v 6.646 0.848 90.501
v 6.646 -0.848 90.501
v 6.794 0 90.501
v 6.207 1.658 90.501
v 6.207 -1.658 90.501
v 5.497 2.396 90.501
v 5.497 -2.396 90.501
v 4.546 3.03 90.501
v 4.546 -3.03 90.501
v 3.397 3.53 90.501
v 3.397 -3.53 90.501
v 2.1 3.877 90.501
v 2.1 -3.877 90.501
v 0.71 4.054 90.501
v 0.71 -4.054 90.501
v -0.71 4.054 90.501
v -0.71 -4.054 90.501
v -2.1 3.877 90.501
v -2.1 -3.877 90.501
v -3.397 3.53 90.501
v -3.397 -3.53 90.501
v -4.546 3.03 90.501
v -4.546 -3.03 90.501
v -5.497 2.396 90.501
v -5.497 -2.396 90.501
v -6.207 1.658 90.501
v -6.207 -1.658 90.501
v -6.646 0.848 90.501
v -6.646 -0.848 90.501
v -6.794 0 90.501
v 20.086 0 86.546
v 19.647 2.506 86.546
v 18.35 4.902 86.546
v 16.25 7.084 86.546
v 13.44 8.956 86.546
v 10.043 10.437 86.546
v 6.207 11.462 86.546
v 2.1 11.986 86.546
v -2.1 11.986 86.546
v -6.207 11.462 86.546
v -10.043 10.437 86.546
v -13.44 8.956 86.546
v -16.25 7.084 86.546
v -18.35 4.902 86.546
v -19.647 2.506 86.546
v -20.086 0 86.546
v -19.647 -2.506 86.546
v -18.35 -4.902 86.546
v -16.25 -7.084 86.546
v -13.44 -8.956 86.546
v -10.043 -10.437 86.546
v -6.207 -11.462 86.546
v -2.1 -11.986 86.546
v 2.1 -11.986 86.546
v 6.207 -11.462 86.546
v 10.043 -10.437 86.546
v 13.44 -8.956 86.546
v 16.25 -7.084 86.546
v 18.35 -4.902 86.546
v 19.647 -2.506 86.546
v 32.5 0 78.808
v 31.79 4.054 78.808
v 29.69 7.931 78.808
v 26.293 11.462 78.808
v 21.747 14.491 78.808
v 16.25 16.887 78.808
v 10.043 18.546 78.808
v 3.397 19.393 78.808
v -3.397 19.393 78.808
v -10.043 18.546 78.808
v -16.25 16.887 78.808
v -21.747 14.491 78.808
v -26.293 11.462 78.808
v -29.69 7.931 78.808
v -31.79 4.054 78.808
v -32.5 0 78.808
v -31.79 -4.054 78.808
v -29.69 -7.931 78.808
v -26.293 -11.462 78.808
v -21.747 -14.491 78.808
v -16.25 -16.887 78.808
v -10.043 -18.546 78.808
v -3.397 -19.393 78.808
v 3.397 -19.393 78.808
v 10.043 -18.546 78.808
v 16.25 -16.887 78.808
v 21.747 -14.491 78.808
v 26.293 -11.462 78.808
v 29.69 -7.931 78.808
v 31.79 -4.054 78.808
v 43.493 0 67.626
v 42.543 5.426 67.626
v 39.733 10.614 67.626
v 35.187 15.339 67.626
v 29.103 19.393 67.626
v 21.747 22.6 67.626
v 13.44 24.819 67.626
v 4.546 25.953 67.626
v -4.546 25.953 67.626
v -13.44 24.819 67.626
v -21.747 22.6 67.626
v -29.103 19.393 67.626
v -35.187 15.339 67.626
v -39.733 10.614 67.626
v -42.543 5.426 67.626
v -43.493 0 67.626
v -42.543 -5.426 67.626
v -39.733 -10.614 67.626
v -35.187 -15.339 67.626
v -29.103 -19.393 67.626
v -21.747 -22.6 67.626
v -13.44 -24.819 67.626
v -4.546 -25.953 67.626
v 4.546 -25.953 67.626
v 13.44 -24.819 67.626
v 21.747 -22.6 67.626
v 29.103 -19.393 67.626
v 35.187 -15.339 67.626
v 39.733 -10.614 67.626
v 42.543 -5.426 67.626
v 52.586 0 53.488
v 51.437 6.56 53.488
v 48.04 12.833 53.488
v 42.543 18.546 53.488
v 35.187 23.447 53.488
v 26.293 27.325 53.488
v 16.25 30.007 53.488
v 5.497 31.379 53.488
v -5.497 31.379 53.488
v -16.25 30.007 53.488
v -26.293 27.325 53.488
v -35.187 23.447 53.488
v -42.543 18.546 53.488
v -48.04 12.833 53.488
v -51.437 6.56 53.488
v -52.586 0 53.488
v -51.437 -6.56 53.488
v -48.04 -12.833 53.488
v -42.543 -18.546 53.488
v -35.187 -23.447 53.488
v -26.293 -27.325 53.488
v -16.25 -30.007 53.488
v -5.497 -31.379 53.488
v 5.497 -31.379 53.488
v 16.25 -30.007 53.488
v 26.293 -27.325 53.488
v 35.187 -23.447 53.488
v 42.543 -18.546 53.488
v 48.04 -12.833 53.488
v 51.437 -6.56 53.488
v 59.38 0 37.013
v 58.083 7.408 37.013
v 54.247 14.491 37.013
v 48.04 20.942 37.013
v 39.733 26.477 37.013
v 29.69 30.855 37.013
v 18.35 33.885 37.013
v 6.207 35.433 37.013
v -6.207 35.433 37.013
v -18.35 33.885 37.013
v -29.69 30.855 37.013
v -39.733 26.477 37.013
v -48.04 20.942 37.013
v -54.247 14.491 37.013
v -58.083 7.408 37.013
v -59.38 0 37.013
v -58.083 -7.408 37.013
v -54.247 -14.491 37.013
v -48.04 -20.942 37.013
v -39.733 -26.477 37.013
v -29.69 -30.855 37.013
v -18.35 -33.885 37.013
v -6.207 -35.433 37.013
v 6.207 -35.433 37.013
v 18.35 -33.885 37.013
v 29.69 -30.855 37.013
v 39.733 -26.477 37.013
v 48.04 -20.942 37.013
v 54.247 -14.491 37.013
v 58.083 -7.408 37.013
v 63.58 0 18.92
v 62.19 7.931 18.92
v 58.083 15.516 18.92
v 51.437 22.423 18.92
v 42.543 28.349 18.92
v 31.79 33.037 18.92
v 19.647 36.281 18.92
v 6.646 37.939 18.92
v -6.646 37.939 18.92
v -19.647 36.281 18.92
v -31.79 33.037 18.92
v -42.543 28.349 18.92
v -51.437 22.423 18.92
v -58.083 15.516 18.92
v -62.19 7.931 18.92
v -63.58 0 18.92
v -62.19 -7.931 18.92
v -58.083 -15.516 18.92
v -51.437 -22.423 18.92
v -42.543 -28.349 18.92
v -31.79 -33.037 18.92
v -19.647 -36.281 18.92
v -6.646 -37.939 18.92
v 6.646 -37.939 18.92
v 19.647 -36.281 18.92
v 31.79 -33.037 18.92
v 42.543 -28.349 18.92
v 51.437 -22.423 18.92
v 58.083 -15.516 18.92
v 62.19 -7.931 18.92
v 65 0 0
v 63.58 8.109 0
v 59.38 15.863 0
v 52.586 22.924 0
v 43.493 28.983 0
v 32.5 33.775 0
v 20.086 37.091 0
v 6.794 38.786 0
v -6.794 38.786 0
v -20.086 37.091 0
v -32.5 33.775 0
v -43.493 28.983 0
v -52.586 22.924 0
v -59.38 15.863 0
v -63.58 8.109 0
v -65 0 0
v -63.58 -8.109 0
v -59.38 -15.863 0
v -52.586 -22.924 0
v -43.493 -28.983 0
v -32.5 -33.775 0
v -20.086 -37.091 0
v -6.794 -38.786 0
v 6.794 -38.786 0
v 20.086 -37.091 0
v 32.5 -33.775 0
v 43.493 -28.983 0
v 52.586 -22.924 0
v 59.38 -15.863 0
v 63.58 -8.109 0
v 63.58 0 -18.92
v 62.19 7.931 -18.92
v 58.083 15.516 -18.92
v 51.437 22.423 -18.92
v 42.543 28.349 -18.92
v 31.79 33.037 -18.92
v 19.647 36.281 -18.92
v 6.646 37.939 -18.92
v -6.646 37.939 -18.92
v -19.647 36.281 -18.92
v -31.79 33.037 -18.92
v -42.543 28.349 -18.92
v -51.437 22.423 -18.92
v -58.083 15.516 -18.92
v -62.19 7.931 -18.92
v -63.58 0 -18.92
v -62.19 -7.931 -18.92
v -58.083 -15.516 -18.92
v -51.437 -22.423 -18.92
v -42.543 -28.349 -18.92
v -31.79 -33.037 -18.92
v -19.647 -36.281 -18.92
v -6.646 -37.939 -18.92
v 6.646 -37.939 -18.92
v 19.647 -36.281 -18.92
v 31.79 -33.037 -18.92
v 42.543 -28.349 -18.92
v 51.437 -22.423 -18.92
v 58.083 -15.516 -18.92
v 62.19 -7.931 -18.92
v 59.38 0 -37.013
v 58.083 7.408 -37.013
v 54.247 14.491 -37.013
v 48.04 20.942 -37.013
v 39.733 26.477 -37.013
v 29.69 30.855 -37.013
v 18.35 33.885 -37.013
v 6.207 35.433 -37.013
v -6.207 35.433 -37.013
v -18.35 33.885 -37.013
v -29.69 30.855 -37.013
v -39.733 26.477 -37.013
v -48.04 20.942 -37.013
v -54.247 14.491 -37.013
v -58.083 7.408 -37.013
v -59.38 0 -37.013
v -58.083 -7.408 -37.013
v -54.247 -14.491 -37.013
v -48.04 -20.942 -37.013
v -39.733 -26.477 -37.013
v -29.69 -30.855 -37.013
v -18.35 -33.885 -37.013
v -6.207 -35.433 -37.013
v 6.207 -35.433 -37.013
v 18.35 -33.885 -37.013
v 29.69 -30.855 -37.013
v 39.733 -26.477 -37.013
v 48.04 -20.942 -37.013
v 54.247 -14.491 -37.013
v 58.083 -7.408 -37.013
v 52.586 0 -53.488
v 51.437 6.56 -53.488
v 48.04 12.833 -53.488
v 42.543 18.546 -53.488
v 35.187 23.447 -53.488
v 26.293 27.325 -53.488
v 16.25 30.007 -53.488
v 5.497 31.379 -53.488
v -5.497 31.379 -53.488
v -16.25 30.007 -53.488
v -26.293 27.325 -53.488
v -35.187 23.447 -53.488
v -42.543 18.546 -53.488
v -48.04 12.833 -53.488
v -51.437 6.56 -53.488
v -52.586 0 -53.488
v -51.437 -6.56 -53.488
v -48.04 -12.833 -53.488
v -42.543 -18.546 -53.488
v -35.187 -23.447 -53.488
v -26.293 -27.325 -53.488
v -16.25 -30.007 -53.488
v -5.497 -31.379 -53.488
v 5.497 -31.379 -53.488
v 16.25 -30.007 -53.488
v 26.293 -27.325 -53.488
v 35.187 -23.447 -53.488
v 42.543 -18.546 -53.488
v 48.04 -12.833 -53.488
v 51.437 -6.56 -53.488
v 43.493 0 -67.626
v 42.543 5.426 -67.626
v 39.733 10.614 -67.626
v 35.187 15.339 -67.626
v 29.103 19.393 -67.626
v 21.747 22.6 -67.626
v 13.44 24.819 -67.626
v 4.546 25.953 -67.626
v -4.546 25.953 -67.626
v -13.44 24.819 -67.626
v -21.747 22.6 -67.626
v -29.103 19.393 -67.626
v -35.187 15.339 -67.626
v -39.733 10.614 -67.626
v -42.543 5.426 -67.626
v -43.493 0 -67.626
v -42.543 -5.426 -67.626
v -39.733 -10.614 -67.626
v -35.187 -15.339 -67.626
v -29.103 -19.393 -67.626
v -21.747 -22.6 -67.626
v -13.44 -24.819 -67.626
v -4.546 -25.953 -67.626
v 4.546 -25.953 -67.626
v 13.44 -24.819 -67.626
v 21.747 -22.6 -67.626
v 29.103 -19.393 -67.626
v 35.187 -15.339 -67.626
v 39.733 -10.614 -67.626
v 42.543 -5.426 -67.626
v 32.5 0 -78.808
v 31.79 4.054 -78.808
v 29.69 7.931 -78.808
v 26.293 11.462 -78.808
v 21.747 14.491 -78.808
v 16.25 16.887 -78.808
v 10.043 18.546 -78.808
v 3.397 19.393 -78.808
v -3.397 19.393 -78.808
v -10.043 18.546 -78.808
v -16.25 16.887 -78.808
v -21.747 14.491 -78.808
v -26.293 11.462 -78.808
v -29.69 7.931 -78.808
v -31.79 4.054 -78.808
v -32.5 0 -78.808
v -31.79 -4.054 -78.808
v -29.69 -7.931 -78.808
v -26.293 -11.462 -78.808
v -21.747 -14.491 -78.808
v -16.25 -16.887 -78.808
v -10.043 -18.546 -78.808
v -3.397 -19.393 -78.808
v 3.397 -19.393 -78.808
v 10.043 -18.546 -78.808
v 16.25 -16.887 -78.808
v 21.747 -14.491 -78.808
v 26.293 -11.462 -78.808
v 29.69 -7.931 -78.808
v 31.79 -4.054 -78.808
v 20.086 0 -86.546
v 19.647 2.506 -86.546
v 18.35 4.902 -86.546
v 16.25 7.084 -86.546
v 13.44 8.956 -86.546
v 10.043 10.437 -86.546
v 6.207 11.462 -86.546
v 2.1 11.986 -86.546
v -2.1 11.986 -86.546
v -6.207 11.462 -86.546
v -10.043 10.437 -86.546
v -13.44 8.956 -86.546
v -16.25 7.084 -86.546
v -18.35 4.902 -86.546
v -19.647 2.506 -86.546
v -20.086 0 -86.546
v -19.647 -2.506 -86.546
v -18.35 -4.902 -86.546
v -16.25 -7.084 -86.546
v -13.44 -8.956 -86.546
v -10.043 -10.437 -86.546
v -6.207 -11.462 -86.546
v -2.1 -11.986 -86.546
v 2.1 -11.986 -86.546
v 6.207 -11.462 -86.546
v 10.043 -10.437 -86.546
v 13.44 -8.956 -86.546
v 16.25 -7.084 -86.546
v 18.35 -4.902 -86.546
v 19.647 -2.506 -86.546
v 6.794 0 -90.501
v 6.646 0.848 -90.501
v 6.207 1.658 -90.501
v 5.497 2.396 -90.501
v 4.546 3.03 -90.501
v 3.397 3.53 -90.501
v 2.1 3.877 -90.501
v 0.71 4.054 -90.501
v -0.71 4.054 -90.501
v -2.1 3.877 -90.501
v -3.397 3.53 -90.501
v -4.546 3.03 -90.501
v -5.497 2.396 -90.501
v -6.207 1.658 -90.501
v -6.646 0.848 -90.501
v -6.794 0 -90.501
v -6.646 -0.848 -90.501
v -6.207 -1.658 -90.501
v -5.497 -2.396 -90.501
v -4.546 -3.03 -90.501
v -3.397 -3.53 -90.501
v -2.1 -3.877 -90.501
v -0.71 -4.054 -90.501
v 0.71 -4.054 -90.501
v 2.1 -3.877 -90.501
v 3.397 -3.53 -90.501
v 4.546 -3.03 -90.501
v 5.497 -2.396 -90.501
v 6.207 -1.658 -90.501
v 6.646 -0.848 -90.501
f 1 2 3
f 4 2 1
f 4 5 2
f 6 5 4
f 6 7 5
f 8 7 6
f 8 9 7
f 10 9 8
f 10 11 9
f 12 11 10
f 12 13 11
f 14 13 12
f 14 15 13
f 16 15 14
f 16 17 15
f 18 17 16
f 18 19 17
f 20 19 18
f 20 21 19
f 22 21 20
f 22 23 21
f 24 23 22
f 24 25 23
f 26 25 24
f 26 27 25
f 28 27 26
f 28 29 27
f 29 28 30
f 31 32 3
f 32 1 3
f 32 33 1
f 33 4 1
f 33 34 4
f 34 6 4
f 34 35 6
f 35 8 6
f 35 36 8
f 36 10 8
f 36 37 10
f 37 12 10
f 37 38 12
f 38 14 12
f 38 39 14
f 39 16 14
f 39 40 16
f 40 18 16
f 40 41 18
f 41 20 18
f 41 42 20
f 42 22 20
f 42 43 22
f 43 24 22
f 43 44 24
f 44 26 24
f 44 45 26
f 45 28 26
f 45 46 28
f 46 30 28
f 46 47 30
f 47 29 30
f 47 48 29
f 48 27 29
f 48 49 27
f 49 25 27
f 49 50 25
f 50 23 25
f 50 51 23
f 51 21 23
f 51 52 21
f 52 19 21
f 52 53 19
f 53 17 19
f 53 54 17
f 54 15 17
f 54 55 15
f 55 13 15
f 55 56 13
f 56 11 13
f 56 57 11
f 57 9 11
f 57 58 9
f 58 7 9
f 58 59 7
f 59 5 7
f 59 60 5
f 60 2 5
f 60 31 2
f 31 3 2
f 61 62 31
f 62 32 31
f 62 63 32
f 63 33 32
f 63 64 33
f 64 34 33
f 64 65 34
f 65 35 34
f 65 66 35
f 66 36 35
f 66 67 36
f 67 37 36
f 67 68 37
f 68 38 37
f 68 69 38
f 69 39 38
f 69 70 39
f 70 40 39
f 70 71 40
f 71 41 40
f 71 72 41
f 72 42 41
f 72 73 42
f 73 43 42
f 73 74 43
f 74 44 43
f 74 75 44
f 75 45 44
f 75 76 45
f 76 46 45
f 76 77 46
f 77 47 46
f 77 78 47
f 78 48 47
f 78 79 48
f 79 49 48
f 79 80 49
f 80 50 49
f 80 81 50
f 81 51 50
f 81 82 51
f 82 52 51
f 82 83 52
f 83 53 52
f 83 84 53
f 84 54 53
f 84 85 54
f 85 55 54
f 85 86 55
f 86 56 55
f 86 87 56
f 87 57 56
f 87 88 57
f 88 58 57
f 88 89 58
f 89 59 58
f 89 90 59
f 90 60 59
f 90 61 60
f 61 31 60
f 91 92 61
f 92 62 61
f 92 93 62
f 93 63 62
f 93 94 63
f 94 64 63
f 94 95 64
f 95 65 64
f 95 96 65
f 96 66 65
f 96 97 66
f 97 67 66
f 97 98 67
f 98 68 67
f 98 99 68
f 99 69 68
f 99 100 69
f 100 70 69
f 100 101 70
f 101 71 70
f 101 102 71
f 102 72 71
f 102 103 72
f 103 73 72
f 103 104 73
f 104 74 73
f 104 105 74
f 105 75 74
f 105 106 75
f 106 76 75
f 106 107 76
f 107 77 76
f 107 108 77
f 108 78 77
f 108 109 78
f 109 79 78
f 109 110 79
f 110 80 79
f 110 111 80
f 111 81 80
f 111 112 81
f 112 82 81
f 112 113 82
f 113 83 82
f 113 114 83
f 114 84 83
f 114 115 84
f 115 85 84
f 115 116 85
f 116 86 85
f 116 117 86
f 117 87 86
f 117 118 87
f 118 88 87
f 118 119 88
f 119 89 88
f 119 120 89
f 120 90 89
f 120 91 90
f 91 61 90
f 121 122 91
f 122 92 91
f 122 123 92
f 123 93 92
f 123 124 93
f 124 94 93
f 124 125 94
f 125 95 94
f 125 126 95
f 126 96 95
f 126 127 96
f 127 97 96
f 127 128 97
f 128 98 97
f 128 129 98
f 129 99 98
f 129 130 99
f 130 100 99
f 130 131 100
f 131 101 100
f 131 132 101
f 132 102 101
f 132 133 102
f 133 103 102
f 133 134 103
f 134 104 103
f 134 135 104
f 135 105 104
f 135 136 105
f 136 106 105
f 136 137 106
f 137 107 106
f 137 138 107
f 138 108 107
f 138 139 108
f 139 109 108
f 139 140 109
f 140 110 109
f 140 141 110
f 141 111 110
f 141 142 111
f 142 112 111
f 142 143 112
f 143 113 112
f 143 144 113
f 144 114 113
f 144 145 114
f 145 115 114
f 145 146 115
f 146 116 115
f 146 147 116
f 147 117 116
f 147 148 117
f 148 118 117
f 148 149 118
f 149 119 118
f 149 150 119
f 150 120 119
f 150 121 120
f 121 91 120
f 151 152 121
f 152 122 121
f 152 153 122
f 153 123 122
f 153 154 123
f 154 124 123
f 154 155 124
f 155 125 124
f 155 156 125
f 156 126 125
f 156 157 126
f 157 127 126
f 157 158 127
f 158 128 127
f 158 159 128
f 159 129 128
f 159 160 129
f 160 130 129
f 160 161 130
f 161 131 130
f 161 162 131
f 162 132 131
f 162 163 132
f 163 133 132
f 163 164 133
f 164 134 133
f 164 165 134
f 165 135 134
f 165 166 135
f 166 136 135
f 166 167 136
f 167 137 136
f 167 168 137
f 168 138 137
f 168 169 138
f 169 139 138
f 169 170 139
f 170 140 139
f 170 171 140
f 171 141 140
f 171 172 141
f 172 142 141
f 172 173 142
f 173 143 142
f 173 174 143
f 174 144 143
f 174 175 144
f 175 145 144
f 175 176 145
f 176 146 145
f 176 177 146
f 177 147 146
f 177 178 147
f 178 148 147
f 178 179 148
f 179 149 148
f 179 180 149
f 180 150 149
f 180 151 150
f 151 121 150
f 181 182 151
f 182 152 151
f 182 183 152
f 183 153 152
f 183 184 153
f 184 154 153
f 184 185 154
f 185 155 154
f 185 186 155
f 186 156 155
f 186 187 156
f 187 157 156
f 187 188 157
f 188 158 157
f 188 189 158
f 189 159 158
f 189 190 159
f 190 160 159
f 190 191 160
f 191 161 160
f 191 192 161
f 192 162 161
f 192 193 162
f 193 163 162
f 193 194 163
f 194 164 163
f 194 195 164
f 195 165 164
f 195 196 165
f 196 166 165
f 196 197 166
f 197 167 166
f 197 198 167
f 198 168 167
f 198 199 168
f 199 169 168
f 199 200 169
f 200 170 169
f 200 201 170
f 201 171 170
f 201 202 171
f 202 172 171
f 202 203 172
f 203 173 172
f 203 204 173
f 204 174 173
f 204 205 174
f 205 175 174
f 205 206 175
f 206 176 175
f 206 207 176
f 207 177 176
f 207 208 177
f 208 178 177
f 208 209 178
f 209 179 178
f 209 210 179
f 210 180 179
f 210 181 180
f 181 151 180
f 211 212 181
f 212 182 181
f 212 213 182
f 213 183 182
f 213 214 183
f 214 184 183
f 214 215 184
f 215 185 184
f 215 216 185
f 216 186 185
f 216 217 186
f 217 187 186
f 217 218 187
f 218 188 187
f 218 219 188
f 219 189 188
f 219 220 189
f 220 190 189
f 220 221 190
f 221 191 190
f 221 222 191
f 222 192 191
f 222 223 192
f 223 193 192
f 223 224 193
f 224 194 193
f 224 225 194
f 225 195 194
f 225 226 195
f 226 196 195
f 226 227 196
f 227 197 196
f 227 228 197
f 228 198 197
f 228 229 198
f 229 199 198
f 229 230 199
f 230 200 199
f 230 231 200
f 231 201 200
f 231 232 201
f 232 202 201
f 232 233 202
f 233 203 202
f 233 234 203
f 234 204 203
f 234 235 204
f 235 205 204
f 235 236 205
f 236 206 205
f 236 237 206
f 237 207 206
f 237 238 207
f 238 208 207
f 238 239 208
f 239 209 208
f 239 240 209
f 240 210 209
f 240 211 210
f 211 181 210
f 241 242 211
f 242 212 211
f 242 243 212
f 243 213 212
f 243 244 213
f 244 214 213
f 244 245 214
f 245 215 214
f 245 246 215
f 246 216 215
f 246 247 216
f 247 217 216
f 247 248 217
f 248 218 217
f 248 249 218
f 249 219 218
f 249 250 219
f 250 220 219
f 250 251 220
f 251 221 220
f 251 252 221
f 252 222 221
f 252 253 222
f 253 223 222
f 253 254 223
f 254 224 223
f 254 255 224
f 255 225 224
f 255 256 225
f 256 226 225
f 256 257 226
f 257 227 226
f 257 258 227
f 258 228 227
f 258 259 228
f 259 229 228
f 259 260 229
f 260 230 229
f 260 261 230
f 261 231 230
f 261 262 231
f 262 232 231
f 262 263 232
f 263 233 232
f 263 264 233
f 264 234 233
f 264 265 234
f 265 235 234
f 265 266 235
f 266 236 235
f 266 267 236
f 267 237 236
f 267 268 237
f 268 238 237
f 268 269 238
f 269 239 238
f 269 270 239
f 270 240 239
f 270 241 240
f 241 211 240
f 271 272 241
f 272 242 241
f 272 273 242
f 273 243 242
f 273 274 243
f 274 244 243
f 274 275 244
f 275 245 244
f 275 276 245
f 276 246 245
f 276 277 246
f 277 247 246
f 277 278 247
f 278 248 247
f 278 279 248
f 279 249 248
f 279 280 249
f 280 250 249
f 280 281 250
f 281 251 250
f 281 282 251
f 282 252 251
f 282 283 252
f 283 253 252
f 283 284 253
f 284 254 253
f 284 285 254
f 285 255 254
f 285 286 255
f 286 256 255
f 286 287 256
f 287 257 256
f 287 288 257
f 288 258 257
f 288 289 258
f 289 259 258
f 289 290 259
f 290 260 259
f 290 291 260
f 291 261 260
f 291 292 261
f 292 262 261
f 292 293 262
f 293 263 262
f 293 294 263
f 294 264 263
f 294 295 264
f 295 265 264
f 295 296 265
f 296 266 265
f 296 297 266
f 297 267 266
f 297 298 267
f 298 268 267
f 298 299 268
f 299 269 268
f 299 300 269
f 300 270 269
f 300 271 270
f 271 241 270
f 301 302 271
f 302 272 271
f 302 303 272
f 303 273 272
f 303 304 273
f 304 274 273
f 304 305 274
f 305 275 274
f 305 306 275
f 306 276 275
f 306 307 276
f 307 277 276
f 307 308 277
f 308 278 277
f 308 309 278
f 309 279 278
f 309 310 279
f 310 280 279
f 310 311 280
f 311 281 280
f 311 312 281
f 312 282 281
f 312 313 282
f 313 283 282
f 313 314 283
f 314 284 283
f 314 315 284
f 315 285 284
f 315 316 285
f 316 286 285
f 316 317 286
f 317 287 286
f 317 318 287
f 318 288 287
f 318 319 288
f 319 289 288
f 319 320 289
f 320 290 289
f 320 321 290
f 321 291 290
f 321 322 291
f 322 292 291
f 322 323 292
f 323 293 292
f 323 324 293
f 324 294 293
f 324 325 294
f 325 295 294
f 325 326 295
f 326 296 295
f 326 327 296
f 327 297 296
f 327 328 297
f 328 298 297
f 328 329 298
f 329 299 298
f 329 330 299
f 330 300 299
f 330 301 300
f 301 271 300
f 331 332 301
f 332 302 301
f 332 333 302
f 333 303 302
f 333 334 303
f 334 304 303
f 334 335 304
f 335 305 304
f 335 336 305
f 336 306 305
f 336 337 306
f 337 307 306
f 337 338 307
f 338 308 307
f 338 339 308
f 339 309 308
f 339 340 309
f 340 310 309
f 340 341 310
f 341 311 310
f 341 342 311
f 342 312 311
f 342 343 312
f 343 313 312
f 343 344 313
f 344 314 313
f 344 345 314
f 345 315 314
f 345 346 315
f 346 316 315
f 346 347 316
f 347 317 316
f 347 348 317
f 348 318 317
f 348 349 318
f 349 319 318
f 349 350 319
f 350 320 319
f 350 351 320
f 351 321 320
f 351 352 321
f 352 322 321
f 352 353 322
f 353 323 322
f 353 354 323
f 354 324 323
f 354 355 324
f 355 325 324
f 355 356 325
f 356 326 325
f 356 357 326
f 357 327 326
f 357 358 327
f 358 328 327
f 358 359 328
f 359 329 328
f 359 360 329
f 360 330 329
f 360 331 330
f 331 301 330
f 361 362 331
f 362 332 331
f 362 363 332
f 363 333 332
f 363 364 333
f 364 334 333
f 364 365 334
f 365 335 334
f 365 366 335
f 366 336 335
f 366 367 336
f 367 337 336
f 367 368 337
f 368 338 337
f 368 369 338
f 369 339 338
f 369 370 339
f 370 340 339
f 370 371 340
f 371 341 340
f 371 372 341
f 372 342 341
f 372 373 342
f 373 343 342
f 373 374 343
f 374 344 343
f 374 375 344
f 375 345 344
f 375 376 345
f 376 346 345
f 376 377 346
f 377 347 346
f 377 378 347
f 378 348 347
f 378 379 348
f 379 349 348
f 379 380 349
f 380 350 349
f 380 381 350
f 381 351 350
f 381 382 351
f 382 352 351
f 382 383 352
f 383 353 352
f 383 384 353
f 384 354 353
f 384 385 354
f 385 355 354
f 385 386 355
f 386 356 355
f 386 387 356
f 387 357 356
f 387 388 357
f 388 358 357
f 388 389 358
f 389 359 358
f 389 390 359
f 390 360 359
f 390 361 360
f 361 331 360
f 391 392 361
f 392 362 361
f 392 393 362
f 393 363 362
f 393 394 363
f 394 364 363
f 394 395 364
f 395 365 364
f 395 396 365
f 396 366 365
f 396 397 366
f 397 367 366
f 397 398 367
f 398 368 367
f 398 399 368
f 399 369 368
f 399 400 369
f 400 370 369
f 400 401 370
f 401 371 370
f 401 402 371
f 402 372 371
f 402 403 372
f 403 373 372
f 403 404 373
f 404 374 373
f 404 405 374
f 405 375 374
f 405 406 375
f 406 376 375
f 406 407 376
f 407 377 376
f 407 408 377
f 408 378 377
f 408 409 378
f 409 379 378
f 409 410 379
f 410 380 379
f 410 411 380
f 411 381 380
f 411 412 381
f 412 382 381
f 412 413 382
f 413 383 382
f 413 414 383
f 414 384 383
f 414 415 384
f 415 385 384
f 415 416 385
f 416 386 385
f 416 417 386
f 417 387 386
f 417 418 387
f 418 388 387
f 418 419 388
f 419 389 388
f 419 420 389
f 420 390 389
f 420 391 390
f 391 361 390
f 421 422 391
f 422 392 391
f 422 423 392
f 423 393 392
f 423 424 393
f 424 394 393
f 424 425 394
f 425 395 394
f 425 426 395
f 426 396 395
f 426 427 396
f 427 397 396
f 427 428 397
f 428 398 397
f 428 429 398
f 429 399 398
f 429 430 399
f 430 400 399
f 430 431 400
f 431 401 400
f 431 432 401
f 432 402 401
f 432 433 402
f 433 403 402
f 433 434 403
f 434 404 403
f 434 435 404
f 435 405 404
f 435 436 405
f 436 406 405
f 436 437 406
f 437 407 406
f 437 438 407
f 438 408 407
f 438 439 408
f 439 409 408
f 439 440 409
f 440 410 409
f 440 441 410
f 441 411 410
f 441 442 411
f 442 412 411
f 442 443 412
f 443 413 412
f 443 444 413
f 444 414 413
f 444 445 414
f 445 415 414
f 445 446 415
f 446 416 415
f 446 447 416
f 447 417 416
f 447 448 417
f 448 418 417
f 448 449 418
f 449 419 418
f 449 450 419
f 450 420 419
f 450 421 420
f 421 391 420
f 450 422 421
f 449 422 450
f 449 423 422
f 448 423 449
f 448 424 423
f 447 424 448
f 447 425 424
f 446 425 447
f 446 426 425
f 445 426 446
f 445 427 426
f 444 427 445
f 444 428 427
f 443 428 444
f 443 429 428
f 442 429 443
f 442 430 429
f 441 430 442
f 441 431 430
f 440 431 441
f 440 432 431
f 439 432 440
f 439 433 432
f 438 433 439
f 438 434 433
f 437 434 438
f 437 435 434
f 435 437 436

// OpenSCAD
// Generated by SolidPython 1.0.1 on 2020-07-29 00:46:46


scale(v = [5, 3, 7]) {
	sphere(r = 13);
}
/***********************************************
*********      SolidPython code:      **********
************************************************
 
# import packages: SolidPython
from solid import *
from solid.utils import *
from itertools import chain, combinations, permutations


class Resize:

    def __init__(self, scad_file):
        self.scad_file = scad_file
        #self.scad_file = import_scad(scad_file)
        # cone/cylinder param:
        self.r1 = 0
        self.r2 = 0
        self.h = 0
        # rectangular prism param:
        self.w = 0
        self.l = 0
        # ellipse param:
        self.r = 0

    # import OpenScad code (file name corresponds to shape)


    # classify shape + parameters
    def assign(self, param1, param2, param3):
        if self.scad_file == 'cone.scad':
            self.r1 = param1
            self.r2 = param2
            self.h = param3
        elif self.scad_file == 'cylinder.scad':
            self.r1 = param1
            self.r2 = param2
            self.h = param3
        elif self.scad_file == 'rectangularPrism.scad':
            self.h = param1
            self.l = param2
            self.w = param3
        else:
            self.r = param1
            self.h = param2

    # resize parameters
    def iterate(self):
        x = range(3, 20, 2)
        i = 1
        if self.scad_file == 'cone.scad':
            tempList = list(permutations(x, 2))
            for temp in tempList:
                param1 = temp[0]
                param2 = temp[1]
                filepath = 'produced_scad_files/' + 'cone' + str(param1) + '_' + str(param2) + '_' + '.scad'
                scad_render_to_file(cylinder(h=param1, r1=param2, r2=0), filepath)

        elif self.scad_file == 'cylinder.scad':
            tempList = list(permutations(x, 3))
            for temp in tempList:
                param1 = temp[0]
                param2 = temp[1]
                filepath = 'produced_scad_files/' + 'cylinder' + str(param1) + '_' + str(param2) + '_' + '.scad'
                scad_render_to_file(cylinder(h=param1, r1=param2, r2=param2), filepath)

        elif self.scad_file == 'rectangularPrism.scad':
            tempList = list(permutations(x, 3))
            for temp in tempList:
                param1 = temp[0]
                param2 = temp[1]
                param3 = temp[2]
                filepath = 'produced_scad_files/' + 'rectangularPrism' + str(param1) + '_' + str(param2) + '_' + str(
                    param3) + '.scad'
                scad_render_to_file(cube(size=(param1, param2, param3)), filepath)

        elif self.scad_file == 'ellipse.scad':
            tempList = list(permutations(x, 4))
            for temp in tempList:
                param1 = temp[0]
                param2 = temp[1]
                param3 = temp[2]
                param4 = temp[3]
                filepath = 'produced_scad_files/' + 'ellipse' + str(param1) + '_' + str(param2) + '_' + str(param3) + '_' + str(param4) + '.scad'
                scad_render_to_file(scale([param1, param2, param3])(sphere(r=param4)), filepath)

    def render_to_scadfile(self):
        scad_render_to_file(scad, 'example.scad') 
 
************************************************/
